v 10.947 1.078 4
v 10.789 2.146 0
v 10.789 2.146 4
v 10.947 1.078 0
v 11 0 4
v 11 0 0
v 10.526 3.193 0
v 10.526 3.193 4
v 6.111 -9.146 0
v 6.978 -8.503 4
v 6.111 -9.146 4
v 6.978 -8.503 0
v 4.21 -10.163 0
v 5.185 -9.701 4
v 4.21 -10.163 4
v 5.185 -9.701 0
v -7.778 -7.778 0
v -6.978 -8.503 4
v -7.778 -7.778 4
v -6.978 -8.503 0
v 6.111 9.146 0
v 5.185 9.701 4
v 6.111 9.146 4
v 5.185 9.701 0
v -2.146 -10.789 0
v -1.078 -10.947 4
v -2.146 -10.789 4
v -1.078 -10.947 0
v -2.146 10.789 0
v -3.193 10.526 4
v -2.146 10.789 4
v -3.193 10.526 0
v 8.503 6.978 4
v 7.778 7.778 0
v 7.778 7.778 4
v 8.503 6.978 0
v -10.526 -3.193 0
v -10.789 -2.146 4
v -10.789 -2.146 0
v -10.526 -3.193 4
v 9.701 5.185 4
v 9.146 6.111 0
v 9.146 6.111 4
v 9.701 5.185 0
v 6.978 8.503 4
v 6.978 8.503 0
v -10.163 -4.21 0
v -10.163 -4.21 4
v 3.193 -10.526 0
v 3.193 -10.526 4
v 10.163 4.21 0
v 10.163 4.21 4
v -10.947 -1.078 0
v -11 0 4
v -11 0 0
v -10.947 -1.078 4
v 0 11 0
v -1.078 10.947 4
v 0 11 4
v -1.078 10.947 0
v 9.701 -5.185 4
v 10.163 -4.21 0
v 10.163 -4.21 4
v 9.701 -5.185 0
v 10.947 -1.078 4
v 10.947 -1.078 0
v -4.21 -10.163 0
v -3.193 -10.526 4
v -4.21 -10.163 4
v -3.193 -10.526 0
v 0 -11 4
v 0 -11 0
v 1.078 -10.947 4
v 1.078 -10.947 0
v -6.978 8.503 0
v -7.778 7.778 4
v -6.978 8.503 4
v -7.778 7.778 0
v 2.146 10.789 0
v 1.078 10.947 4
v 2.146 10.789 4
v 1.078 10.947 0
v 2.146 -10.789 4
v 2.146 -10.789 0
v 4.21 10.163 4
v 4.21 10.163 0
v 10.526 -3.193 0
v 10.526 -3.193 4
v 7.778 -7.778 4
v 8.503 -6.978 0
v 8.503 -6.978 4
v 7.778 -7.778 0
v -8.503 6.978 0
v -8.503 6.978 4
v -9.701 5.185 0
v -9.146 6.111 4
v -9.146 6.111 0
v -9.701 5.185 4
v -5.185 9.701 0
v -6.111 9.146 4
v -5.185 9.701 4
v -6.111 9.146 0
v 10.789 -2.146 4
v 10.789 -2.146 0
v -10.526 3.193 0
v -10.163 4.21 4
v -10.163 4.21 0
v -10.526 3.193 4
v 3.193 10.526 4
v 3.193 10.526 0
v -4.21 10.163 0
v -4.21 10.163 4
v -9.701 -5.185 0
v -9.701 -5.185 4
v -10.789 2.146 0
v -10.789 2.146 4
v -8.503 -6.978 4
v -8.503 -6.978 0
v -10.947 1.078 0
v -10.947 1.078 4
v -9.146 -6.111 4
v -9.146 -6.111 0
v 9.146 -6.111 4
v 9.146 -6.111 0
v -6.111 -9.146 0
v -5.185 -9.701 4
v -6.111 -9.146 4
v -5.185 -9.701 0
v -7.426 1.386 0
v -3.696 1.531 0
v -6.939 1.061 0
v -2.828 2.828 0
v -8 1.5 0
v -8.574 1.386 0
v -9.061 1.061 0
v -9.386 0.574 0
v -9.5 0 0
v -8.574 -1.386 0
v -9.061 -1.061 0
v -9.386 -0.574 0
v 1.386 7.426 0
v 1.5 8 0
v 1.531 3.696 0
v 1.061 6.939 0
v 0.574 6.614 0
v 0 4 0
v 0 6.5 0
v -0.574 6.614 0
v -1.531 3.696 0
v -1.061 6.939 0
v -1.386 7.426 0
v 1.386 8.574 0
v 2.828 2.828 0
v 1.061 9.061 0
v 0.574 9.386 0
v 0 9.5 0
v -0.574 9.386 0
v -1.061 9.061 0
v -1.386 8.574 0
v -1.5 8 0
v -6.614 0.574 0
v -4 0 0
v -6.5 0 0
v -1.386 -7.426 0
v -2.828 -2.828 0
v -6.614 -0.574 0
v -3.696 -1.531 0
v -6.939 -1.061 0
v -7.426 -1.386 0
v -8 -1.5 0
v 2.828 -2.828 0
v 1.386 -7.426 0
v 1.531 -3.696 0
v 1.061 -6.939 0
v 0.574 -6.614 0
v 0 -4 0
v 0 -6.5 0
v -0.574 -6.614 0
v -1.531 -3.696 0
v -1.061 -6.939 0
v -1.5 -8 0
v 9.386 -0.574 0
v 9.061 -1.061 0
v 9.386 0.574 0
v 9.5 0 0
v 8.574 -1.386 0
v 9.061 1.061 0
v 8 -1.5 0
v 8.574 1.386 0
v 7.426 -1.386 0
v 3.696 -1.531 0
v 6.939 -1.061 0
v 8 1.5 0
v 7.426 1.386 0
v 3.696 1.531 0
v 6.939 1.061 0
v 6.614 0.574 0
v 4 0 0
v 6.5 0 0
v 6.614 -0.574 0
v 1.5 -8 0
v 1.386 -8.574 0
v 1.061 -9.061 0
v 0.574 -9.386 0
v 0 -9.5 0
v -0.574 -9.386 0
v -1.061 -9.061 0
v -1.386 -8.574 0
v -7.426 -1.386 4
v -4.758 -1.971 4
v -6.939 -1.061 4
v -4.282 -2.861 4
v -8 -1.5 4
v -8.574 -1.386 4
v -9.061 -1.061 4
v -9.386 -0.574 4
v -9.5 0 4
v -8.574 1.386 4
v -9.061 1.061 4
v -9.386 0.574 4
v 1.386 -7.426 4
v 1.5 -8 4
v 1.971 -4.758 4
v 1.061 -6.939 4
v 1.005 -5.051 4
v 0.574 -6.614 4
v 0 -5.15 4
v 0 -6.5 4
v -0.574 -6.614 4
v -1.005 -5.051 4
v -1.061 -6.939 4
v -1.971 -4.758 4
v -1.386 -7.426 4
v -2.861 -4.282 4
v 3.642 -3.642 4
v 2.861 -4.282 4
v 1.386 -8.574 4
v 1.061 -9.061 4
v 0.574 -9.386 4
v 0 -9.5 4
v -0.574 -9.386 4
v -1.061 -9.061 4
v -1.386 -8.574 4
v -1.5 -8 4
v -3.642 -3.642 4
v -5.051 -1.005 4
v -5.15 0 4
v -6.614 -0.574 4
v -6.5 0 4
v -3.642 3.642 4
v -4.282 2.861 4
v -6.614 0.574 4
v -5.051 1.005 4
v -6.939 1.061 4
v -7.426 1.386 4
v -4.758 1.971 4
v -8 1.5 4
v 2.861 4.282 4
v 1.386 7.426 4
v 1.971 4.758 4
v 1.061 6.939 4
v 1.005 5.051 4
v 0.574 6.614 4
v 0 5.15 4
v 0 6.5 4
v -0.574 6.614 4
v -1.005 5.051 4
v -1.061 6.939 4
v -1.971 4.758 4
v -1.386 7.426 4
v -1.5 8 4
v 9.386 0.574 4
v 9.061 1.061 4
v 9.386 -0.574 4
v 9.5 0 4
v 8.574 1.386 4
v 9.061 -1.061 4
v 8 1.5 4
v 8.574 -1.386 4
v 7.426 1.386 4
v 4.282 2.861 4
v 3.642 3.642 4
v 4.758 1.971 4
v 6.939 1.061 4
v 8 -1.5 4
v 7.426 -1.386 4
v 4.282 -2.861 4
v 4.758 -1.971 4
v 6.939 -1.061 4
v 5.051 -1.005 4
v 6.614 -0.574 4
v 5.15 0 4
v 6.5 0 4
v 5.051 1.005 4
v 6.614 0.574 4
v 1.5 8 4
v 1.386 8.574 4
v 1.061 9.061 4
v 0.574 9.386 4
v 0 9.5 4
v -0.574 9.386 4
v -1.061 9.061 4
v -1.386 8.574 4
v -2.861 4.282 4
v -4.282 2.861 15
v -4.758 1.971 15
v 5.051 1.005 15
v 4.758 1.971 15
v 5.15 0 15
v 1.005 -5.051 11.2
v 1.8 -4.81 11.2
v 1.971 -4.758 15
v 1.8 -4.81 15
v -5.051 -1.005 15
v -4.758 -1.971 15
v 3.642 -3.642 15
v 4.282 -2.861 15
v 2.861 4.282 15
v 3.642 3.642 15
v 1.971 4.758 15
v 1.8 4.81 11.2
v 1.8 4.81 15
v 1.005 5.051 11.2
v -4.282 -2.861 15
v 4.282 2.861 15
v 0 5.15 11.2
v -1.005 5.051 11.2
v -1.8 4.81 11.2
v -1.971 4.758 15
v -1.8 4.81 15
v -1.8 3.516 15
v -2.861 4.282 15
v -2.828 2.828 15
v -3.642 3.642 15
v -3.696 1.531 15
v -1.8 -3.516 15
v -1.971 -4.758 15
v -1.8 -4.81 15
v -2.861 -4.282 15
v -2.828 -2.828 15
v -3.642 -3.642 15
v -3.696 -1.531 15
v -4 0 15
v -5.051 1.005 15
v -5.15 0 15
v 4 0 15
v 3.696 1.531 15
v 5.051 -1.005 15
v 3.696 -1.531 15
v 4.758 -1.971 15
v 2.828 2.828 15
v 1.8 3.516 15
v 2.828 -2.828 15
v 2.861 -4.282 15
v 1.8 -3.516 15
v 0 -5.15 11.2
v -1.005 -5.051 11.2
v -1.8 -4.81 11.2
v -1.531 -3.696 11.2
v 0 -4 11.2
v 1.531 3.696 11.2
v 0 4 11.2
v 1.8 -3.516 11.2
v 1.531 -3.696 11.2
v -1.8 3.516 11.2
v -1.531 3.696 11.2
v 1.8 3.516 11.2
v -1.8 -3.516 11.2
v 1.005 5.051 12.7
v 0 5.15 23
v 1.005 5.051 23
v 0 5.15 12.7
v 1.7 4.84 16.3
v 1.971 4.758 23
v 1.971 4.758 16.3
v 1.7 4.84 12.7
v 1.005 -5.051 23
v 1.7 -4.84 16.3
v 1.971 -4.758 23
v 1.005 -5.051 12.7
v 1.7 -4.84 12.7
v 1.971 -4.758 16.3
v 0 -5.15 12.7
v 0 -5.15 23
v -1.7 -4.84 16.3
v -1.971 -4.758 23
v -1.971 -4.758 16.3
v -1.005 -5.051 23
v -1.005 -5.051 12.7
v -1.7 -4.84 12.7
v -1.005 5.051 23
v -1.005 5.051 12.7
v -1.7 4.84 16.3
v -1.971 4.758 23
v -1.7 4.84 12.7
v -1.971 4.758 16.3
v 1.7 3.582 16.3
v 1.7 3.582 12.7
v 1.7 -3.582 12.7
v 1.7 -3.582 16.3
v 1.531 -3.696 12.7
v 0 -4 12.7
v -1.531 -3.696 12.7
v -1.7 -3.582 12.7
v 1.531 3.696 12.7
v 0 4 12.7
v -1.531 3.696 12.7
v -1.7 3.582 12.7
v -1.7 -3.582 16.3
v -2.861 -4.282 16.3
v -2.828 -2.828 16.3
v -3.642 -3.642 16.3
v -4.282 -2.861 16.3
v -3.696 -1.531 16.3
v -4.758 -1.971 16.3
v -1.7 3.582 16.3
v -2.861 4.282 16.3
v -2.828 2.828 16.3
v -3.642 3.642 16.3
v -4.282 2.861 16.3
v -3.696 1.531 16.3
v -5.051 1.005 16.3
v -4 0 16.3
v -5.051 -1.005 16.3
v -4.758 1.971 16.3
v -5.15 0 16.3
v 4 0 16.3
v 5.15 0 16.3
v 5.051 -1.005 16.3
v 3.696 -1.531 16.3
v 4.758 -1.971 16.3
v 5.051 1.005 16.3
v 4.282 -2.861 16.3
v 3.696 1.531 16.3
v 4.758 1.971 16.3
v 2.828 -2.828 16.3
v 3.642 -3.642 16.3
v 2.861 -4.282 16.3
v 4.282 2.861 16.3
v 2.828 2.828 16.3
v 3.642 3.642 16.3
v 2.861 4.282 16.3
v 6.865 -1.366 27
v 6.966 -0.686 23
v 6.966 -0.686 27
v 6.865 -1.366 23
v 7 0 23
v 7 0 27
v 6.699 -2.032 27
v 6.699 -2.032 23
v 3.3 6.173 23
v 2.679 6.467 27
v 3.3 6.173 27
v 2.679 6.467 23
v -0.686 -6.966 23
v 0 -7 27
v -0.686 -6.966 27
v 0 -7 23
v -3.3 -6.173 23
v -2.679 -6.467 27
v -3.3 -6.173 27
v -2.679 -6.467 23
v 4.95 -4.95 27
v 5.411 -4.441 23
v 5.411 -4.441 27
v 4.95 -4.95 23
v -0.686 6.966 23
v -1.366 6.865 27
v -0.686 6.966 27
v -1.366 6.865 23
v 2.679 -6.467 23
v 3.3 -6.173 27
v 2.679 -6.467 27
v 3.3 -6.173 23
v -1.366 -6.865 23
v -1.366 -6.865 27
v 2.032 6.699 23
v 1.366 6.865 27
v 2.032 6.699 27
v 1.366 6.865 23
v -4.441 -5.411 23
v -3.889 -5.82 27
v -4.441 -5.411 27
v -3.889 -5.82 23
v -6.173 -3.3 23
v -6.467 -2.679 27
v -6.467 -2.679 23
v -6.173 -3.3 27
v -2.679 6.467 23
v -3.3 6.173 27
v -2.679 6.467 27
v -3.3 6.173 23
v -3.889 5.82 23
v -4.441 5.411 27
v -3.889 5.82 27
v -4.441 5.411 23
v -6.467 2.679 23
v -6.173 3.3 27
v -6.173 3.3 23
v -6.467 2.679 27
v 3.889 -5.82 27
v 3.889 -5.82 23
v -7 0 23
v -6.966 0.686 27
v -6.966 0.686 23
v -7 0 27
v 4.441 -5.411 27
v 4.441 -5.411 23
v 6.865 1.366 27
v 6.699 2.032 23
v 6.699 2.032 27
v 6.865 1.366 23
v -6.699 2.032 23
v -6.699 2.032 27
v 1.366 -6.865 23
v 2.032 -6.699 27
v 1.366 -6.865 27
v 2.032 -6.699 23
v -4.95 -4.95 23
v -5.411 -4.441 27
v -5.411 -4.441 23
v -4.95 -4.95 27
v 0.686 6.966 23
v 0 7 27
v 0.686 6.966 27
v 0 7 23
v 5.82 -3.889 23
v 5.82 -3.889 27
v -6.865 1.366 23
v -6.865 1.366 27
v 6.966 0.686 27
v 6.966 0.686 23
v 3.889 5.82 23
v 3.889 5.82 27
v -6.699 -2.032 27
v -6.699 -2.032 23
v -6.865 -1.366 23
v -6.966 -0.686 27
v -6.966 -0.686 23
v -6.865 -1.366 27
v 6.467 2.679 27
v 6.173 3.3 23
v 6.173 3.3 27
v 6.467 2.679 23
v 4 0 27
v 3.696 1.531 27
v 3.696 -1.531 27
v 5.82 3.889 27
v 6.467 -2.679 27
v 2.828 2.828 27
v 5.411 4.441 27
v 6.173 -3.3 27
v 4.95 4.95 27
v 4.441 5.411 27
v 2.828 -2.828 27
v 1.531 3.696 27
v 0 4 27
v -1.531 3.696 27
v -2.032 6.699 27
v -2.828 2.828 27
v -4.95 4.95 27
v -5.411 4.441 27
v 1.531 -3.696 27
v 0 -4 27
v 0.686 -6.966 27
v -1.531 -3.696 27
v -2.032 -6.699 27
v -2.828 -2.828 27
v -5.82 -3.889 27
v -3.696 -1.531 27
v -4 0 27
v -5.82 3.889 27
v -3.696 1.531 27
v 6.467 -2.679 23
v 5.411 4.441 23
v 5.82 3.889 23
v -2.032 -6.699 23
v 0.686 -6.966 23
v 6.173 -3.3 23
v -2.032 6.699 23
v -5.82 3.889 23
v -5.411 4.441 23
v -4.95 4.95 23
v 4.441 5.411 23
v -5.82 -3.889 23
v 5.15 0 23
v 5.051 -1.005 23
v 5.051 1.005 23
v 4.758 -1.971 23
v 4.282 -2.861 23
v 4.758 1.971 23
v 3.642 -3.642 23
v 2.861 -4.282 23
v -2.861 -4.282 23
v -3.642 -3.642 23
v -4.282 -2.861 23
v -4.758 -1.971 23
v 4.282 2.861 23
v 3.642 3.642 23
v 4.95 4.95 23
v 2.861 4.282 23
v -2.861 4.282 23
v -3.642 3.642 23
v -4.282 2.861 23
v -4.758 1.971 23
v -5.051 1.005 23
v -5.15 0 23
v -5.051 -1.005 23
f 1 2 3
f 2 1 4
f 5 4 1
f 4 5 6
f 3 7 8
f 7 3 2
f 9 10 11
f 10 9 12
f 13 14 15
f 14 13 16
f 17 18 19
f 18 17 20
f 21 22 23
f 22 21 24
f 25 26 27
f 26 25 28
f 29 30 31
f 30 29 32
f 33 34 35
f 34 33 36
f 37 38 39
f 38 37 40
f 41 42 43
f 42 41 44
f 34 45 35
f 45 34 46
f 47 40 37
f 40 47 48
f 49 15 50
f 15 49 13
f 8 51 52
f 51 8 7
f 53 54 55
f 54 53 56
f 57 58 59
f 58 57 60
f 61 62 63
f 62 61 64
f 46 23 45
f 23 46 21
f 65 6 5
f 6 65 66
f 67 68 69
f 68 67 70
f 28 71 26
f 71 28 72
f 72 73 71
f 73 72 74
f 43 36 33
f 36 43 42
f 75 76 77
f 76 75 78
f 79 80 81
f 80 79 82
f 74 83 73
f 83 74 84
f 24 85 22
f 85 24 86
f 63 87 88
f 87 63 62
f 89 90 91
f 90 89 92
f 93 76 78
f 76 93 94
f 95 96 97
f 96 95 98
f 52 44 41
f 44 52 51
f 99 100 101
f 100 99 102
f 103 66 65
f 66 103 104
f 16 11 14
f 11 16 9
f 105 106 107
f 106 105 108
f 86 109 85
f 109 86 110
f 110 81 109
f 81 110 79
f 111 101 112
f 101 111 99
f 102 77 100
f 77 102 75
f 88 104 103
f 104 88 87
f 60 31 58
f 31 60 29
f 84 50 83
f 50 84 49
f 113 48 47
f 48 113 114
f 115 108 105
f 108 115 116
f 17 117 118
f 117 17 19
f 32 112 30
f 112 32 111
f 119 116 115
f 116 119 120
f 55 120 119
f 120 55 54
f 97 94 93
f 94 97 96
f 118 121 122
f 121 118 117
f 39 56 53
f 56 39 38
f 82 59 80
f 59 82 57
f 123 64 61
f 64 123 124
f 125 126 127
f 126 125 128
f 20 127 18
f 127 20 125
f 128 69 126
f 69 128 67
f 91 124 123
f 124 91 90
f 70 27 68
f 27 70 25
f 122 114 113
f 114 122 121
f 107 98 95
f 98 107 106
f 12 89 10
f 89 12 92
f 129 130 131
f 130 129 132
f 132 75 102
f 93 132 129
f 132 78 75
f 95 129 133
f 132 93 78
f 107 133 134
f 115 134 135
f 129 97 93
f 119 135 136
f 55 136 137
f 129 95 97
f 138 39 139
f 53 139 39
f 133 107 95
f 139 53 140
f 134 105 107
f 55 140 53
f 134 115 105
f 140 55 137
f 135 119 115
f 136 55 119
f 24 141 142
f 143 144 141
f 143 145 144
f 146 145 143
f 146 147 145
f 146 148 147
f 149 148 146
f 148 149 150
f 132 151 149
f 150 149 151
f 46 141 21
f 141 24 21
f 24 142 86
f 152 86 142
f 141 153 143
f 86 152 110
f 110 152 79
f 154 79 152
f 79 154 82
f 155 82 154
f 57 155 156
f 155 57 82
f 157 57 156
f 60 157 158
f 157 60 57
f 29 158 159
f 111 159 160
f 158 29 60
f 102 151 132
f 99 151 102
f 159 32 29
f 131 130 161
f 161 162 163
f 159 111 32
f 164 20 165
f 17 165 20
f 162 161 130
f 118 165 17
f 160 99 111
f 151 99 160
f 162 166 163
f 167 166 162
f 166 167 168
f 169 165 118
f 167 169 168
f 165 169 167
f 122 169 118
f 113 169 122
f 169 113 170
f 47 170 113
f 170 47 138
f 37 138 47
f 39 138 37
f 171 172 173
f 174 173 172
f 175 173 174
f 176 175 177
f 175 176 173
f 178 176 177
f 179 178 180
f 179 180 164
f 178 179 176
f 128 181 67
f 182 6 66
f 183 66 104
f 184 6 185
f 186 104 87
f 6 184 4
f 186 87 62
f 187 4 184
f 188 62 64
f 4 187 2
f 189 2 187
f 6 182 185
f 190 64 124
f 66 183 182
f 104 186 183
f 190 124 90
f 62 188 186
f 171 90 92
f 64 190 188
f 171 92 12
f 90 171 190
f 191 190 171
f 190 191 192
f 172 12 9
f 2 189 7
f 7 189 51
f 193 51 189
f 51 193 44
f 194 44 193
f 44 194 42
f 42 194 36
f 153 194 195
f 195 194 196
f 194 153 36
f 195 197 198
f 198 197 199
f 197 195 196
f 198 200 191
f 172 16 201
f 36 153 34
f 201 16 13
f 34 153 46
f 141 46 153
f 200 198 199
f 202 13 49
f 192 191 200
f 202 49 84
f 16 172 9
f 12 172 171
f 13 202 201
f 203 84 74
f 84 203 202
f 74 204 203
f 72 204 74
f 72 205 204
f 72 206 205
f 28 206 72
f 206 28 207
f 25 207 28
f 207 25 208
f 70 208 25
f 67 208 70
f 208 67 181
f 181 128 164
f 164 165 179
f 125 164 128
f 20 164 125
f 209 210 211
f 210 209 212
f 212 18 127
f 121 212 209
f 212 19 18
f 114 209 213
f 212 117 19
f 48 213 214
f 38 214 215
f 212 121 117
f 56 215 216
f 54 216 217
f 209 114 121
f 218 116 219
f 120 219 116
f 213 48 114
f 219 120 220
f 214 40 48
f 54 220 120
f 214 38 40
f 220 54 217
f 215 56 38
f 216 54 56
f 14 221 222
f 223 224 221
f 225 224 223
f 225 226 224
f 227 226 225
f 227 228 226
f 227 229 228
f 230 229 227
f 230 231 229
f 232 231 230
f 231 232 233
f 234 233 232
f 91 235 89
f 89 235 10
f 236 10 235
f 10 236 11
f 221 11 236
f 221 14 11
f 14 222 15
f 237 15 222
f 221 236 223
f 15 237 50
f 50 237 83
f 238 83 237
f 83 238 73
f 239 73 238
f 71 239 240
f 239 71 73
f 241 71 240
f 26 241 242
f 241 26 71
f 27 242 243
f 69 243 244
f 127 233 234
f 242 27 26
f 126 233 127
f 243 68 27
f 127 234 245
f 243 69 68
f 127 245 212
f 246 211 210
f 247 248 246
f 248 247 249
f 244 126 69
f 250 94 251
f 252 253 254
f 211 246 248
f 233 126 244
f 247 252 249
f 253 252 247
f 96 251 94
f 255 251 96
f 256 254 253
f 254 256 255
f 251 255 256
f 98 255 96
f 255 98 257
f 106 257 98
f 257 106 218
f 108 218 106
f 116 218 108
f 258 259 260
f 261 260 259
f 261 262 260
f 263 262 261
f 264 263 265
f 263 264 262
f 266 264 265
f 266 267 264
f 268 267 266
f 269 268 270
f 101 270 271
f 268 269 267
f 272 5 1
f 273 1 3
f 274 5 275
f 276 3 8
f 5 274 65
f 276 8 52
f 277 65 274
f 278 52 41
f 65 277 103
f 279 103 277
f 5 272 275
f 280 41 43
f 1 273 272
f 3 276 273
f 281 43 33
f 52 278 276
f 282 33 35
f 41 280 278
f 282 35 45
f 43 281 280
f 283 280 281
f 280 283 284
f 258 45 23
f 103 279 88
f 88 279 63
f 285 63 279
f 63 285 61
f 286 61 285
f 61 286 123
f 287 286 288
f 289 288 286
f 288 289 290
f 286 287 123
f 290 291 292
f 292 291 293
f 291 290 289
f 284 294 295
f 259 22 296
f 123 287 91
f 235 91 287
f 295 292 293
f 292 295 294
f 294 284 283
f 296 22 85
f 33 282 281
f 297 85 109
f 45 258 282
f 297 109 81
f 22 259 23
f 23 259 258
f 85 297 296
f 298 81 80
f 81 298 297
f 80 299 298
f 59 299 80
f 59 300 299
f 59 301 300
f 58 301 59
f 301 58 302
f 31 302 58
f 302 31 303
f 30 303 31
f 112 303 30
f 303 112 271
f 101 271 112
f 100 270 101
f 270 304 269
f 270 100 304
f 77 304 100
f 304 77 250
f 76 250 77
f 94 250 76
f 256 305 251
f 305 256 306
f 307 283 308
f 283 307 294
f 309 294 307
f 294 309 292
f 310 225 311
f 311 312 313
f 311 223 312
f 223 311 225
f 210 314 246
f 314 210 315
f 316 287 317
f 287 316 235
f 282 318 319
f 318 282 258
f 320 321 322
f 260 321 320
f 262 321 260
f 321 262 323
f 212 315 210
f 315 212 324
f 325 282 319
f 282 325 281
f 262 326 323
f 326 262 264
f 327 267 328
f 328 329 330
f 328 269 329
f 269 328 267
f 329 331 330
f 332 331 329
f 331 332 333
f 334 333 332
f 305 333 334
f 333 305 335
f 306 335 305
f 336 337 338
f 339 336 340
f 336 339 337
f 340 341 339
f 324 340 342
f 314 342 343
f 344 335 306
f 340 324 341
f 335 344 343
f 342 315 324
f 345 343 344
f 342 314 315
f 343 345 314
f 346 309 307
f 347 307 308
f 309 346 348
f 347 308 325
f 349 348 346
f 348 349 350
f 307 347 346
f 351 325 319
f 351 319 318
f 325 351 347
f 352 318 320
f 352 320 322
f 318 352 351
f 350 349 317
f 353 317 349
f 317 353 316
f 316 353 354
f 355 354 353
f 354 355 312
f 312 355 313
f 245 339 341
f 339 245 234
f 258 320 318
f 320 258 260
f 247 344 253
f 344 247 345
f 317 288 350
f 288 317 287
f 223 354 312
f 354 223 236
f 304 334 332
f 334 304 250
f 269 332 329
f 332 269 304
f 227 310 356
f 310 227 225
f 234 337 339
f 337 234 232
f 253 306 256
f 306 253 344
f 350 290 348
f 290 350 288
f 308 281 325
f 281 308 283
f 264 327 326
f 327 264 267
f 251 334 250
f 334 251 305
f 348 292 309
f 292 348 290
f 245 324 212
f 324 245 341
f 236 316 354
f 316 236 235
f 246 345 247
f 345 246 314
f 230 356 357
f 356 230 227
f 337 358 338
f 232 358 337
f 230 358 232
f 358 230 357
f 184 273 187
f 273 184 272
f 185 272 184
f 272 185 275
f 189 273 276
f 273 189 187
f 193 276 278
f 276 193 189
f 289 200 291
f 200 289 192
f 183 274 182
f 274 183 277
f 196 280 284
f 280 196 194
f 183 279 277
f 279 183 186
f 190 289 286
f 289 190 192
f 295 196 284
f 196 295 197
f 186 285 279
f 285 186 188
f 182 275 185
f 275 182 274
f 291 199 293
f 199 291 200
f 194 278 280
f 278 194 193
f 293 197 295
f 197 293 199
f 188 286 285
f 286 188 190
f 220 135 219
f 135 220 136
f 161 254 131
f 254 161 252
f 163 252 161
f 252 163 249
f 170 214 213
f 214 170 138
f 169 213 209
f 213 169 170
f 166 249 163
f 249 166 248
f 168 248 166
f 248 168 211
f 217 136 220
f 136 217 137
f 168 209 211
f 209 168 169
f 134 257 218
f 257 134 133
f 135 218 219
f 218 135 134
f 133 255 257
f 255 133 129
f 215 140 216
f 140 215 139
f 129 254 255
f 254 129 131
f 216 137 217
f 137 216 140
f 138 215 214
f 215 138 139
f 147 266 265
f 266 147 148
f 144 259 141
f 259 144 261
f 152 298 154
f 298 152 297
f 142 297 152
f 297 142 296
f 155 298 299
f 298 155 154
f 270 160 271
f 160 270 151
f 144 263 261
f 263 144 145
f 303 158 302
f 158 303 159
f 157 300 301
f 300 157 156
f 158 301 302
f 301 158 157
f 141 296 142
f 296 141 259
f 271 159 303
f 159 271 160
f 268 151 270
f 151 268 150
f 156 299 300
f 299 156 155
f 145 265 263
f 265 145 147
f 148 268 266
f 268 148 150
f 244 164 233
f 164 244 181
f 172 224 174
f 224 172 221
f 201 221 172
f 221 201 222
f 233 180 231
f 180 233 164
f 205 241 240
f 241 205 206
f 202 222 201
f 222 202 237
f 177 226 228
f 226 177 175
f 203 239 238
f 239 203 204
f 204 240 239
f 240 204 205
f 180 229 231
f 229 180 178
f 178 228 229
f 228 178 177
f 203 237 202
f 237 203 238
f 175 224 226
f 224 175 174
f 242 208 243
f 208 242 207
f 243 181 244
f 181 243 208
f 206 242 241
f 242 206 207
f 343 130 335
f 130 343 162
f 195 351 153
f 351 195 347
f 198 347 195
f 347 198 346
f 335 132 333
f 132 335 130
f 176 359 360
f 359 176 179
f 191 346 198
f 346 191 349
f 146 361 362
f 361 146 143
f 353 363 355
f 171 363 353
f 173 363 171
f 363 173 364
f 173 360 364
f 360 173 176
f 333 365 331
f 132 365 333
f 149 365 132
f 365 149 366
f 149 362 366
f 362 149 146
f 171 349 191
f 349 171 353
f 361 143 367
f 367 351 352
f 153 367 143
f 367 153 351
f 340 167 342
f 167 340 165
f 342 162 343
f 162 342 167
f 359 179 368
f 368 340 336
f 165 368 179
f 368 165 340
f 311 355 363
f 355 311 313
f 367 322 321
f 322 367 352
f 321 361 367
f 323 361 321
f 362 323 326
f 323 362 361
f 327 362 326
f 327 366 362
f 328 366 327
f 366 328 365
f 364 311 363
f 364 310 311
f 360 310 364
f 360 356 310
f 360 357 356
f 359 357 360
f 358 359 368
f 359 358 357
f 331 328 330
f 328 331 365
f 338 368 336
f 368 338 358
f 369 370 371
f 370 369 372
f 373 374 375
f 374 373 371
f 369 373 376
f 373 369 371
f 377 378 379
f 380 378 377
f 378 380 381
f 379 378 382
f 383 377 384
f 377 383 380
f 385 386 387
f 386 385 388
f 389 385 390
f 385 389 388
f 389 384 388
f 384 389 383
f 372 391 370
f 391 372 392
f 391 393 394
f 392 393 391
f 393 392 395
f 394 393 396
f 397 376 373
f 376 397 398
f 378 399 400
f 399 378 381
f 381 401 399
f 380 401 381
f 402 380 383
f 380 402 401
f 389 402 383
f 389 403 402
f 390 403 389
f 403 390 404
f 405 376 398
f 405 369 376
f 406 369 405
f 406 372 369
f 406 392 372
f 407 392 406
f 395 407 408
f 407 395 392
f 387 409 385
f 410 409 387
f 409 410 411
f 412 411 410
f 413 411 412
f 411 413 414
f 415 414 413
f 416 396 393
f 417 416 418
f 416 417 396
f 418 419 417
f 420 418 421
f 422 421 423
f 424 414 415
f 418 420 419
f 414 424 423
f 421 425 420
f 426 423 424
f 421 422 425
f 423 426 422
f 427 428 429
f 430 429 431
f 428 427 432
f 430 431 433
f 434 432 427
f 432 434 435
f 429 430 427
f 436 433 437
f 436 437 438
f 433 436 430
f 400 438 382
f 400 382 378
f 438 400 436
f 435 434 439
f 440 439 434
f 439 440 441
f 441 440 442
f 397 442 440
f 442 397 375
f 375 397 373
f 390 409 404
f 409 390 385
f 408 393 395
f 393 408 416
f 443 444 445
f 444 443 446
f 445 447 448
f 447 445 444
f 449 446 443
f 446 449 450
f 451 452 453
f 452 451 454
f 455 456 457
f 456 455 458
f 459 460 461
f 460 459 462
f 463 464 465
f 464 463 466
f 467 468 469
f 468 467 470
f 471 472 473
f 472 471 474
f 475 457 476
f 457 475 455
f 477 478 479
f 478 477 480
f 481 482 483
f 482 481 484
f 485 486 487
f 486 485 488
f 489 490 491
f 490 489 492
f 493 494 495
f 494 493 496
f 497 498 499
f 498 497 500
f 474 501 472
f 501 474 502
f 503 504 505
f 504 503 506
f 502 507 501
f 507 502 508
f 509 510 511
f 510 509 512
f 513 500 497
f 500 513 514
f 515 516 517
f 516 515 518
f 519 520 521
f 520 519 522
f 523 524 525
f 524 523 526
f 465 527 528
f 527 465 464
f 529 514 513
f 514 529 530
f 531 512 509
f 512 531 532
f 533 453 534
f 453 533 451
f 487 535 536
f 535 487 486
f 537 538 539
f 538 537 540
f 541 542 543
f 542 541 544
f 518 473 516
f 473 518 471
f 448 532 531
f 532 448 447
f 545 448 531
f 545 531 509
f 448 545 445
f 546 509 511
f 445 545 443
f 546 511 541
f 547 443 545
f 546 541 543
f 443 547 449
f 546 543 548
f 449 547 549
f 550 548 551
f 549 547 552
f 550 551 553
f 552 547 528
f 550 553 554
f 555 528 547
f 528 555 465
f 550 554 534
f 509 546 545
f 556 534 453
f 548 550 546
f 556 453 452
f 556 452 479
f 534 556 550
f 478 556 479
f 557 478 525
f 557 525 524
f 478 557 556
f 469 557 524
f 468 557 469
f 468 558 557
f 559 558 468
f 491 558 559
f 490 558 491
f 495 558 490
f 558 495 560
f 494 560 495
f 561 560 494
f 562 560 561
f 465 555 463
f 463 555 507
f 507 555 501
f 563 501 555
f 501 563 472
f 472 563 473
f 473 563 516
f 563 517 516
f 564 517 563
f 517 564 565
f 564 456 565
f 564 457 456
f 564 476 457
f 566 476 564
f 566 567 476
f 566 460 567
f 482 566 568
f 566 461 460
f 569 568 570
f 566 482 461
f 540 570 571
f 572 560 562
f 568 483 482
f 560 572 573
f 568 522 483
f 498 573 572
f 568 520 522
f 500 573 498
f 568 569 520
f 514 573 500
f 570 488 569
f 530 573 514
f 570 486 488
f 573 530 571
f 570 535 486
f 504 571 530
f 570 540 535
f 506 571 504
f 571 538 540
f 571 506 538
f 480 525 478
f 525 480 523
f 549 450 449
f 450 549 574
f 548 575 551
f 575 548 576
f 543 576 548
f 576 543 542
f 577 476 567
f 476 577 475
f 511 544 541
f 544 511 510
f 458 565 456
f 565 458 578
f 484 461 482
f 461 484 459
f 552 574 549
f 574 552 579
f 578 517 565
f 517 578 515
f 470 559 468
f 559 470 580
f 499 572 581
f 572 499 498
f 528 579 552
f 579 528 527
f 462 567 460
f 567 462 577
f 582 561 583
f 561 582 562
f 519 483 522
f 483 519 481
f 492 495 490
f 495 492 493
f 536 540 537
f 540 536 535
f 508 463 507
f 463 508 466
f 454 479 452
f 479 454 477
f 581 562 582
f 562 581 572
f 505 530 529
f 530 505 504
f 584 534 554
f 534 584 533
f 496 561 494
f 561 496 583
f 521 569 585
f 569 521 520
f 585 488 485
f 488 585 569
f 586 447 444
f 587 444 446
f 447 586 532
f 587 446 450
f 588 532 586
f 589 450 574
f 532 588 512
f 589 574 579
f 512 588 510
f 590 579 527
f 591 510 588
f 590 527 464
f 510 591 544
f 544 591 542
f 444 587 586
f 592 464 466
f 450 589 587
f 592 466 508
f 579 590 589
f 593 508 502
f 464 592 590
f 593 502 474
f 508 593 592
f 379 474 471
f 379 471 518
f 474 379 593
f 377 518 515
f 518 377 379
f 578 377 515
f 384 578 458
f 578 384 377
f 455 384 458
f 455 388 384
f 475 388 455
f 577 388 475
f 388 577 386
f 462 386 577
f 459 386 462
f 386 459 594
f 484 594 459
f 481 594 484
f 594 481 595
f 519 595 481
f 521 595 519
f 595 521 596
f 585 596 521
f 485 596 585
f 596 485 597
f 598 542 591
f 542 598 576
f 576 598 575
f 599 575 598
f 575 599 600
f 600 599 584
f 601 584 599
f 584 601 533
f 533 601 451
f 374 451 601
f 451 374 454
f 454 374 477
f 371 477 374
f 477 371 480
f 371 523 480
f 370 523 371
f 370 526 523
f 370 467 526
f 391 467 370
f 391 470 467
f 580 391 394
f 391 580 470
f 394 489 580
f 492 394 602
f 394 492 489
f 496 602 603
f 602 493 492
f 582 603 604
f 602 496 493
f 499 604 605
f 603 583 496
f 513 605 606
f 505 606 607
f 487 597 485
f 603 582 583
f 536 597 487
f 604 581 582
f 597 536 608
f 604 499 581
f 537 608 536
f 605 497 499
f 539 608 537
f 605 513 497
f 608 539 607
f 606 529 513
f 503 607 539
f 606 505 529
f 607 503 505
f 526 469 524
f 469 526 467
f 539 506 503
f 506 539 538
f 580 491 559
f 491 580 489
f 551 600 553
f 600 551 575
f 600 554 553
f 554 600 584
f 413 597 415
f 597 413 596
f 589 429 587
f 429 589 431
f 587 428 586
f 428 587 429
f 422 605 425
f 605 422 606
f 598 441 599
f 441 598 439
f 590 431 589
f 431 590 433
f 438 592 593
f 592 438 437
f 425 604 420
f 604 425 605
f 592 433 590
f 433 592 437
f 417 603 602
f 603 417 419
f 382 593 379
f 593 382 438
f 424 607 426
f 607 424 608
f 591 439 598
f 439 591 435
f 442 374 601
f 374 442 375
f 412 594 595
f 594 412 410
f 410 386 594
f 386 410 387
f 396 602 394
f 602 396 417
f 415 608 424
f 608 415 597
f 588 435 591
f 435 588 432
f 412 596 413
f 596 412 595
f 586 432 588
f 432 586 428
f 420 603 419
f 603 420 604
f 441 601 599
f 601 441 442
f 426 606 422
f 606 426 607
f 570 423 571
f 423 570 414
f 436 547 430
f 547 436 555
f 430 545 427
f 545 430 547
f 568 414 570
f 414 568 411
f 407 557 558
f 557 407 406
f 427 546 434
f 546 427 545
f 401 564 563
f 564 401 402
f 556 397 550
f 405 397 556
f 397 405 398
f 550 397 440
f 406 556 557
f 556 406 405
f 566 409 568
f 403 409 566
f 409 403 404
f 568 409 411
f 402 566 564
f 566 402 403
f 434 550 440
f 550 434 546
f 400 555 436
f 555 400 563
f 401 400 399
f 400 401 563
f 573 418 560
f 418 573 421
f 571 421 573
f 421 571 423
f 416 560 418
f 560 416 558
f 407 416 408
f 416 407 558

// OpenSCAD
module TR8x8() {
    difference() {
        union() {
            // Nut head
            cylinder(h = 4, d = 22, $fn = 64);
            // Nut neck
            cylinder(h = 15, d = 10.3, $fn = 32);
        }

        // M3 screw holes
        translate([8, 0, -1]) cylinder(h = 6, d = 3, $fn = 16);
        translate([-8, 0, -1]) cylinder(h = 6, d = 3, $fn = 16);
        translate([0, 8, -1]) cylinder(h = 6, d = 3, $fn = 16);
        translate([0, -8, -1]) cylinder(h = 6, d = 3, $fn = 16);

        // M8 hole
        translate([0, 0, -1]) cylinder(h = 34, d = 8, $fn = 16);

        // Coupler hole
        translate([-3.6/2, -22/2, 15 - 3.8]) cube([3.6, 22, 4]);
    }

    translate([0, 0, 15 + 12]) 
    rotate([180, 0, 0])
    difference() {
        union() {
            // Nut head
            cylinder(h = 4, d = 14, $fn = 64);
            // Nut neck
            cylinder(h = 10.7, d = 10.3, $fn = 32);

            intersection() {
                // Nut neck
                cylinder(h = 20, d = 10.3, $fn = 32);
                // Coupler
                translate([-(3.6 - 0.2) / 2, -22/2, 10.7]) cube([3.6 - 0.2, 22, 3.8 - 0.2]);
            }
        }

        // M8 hole
        translate([0, 0, -1]) cylinder(h = 34, d = 8, $fn = 16);
    }
}

TR8x8();
